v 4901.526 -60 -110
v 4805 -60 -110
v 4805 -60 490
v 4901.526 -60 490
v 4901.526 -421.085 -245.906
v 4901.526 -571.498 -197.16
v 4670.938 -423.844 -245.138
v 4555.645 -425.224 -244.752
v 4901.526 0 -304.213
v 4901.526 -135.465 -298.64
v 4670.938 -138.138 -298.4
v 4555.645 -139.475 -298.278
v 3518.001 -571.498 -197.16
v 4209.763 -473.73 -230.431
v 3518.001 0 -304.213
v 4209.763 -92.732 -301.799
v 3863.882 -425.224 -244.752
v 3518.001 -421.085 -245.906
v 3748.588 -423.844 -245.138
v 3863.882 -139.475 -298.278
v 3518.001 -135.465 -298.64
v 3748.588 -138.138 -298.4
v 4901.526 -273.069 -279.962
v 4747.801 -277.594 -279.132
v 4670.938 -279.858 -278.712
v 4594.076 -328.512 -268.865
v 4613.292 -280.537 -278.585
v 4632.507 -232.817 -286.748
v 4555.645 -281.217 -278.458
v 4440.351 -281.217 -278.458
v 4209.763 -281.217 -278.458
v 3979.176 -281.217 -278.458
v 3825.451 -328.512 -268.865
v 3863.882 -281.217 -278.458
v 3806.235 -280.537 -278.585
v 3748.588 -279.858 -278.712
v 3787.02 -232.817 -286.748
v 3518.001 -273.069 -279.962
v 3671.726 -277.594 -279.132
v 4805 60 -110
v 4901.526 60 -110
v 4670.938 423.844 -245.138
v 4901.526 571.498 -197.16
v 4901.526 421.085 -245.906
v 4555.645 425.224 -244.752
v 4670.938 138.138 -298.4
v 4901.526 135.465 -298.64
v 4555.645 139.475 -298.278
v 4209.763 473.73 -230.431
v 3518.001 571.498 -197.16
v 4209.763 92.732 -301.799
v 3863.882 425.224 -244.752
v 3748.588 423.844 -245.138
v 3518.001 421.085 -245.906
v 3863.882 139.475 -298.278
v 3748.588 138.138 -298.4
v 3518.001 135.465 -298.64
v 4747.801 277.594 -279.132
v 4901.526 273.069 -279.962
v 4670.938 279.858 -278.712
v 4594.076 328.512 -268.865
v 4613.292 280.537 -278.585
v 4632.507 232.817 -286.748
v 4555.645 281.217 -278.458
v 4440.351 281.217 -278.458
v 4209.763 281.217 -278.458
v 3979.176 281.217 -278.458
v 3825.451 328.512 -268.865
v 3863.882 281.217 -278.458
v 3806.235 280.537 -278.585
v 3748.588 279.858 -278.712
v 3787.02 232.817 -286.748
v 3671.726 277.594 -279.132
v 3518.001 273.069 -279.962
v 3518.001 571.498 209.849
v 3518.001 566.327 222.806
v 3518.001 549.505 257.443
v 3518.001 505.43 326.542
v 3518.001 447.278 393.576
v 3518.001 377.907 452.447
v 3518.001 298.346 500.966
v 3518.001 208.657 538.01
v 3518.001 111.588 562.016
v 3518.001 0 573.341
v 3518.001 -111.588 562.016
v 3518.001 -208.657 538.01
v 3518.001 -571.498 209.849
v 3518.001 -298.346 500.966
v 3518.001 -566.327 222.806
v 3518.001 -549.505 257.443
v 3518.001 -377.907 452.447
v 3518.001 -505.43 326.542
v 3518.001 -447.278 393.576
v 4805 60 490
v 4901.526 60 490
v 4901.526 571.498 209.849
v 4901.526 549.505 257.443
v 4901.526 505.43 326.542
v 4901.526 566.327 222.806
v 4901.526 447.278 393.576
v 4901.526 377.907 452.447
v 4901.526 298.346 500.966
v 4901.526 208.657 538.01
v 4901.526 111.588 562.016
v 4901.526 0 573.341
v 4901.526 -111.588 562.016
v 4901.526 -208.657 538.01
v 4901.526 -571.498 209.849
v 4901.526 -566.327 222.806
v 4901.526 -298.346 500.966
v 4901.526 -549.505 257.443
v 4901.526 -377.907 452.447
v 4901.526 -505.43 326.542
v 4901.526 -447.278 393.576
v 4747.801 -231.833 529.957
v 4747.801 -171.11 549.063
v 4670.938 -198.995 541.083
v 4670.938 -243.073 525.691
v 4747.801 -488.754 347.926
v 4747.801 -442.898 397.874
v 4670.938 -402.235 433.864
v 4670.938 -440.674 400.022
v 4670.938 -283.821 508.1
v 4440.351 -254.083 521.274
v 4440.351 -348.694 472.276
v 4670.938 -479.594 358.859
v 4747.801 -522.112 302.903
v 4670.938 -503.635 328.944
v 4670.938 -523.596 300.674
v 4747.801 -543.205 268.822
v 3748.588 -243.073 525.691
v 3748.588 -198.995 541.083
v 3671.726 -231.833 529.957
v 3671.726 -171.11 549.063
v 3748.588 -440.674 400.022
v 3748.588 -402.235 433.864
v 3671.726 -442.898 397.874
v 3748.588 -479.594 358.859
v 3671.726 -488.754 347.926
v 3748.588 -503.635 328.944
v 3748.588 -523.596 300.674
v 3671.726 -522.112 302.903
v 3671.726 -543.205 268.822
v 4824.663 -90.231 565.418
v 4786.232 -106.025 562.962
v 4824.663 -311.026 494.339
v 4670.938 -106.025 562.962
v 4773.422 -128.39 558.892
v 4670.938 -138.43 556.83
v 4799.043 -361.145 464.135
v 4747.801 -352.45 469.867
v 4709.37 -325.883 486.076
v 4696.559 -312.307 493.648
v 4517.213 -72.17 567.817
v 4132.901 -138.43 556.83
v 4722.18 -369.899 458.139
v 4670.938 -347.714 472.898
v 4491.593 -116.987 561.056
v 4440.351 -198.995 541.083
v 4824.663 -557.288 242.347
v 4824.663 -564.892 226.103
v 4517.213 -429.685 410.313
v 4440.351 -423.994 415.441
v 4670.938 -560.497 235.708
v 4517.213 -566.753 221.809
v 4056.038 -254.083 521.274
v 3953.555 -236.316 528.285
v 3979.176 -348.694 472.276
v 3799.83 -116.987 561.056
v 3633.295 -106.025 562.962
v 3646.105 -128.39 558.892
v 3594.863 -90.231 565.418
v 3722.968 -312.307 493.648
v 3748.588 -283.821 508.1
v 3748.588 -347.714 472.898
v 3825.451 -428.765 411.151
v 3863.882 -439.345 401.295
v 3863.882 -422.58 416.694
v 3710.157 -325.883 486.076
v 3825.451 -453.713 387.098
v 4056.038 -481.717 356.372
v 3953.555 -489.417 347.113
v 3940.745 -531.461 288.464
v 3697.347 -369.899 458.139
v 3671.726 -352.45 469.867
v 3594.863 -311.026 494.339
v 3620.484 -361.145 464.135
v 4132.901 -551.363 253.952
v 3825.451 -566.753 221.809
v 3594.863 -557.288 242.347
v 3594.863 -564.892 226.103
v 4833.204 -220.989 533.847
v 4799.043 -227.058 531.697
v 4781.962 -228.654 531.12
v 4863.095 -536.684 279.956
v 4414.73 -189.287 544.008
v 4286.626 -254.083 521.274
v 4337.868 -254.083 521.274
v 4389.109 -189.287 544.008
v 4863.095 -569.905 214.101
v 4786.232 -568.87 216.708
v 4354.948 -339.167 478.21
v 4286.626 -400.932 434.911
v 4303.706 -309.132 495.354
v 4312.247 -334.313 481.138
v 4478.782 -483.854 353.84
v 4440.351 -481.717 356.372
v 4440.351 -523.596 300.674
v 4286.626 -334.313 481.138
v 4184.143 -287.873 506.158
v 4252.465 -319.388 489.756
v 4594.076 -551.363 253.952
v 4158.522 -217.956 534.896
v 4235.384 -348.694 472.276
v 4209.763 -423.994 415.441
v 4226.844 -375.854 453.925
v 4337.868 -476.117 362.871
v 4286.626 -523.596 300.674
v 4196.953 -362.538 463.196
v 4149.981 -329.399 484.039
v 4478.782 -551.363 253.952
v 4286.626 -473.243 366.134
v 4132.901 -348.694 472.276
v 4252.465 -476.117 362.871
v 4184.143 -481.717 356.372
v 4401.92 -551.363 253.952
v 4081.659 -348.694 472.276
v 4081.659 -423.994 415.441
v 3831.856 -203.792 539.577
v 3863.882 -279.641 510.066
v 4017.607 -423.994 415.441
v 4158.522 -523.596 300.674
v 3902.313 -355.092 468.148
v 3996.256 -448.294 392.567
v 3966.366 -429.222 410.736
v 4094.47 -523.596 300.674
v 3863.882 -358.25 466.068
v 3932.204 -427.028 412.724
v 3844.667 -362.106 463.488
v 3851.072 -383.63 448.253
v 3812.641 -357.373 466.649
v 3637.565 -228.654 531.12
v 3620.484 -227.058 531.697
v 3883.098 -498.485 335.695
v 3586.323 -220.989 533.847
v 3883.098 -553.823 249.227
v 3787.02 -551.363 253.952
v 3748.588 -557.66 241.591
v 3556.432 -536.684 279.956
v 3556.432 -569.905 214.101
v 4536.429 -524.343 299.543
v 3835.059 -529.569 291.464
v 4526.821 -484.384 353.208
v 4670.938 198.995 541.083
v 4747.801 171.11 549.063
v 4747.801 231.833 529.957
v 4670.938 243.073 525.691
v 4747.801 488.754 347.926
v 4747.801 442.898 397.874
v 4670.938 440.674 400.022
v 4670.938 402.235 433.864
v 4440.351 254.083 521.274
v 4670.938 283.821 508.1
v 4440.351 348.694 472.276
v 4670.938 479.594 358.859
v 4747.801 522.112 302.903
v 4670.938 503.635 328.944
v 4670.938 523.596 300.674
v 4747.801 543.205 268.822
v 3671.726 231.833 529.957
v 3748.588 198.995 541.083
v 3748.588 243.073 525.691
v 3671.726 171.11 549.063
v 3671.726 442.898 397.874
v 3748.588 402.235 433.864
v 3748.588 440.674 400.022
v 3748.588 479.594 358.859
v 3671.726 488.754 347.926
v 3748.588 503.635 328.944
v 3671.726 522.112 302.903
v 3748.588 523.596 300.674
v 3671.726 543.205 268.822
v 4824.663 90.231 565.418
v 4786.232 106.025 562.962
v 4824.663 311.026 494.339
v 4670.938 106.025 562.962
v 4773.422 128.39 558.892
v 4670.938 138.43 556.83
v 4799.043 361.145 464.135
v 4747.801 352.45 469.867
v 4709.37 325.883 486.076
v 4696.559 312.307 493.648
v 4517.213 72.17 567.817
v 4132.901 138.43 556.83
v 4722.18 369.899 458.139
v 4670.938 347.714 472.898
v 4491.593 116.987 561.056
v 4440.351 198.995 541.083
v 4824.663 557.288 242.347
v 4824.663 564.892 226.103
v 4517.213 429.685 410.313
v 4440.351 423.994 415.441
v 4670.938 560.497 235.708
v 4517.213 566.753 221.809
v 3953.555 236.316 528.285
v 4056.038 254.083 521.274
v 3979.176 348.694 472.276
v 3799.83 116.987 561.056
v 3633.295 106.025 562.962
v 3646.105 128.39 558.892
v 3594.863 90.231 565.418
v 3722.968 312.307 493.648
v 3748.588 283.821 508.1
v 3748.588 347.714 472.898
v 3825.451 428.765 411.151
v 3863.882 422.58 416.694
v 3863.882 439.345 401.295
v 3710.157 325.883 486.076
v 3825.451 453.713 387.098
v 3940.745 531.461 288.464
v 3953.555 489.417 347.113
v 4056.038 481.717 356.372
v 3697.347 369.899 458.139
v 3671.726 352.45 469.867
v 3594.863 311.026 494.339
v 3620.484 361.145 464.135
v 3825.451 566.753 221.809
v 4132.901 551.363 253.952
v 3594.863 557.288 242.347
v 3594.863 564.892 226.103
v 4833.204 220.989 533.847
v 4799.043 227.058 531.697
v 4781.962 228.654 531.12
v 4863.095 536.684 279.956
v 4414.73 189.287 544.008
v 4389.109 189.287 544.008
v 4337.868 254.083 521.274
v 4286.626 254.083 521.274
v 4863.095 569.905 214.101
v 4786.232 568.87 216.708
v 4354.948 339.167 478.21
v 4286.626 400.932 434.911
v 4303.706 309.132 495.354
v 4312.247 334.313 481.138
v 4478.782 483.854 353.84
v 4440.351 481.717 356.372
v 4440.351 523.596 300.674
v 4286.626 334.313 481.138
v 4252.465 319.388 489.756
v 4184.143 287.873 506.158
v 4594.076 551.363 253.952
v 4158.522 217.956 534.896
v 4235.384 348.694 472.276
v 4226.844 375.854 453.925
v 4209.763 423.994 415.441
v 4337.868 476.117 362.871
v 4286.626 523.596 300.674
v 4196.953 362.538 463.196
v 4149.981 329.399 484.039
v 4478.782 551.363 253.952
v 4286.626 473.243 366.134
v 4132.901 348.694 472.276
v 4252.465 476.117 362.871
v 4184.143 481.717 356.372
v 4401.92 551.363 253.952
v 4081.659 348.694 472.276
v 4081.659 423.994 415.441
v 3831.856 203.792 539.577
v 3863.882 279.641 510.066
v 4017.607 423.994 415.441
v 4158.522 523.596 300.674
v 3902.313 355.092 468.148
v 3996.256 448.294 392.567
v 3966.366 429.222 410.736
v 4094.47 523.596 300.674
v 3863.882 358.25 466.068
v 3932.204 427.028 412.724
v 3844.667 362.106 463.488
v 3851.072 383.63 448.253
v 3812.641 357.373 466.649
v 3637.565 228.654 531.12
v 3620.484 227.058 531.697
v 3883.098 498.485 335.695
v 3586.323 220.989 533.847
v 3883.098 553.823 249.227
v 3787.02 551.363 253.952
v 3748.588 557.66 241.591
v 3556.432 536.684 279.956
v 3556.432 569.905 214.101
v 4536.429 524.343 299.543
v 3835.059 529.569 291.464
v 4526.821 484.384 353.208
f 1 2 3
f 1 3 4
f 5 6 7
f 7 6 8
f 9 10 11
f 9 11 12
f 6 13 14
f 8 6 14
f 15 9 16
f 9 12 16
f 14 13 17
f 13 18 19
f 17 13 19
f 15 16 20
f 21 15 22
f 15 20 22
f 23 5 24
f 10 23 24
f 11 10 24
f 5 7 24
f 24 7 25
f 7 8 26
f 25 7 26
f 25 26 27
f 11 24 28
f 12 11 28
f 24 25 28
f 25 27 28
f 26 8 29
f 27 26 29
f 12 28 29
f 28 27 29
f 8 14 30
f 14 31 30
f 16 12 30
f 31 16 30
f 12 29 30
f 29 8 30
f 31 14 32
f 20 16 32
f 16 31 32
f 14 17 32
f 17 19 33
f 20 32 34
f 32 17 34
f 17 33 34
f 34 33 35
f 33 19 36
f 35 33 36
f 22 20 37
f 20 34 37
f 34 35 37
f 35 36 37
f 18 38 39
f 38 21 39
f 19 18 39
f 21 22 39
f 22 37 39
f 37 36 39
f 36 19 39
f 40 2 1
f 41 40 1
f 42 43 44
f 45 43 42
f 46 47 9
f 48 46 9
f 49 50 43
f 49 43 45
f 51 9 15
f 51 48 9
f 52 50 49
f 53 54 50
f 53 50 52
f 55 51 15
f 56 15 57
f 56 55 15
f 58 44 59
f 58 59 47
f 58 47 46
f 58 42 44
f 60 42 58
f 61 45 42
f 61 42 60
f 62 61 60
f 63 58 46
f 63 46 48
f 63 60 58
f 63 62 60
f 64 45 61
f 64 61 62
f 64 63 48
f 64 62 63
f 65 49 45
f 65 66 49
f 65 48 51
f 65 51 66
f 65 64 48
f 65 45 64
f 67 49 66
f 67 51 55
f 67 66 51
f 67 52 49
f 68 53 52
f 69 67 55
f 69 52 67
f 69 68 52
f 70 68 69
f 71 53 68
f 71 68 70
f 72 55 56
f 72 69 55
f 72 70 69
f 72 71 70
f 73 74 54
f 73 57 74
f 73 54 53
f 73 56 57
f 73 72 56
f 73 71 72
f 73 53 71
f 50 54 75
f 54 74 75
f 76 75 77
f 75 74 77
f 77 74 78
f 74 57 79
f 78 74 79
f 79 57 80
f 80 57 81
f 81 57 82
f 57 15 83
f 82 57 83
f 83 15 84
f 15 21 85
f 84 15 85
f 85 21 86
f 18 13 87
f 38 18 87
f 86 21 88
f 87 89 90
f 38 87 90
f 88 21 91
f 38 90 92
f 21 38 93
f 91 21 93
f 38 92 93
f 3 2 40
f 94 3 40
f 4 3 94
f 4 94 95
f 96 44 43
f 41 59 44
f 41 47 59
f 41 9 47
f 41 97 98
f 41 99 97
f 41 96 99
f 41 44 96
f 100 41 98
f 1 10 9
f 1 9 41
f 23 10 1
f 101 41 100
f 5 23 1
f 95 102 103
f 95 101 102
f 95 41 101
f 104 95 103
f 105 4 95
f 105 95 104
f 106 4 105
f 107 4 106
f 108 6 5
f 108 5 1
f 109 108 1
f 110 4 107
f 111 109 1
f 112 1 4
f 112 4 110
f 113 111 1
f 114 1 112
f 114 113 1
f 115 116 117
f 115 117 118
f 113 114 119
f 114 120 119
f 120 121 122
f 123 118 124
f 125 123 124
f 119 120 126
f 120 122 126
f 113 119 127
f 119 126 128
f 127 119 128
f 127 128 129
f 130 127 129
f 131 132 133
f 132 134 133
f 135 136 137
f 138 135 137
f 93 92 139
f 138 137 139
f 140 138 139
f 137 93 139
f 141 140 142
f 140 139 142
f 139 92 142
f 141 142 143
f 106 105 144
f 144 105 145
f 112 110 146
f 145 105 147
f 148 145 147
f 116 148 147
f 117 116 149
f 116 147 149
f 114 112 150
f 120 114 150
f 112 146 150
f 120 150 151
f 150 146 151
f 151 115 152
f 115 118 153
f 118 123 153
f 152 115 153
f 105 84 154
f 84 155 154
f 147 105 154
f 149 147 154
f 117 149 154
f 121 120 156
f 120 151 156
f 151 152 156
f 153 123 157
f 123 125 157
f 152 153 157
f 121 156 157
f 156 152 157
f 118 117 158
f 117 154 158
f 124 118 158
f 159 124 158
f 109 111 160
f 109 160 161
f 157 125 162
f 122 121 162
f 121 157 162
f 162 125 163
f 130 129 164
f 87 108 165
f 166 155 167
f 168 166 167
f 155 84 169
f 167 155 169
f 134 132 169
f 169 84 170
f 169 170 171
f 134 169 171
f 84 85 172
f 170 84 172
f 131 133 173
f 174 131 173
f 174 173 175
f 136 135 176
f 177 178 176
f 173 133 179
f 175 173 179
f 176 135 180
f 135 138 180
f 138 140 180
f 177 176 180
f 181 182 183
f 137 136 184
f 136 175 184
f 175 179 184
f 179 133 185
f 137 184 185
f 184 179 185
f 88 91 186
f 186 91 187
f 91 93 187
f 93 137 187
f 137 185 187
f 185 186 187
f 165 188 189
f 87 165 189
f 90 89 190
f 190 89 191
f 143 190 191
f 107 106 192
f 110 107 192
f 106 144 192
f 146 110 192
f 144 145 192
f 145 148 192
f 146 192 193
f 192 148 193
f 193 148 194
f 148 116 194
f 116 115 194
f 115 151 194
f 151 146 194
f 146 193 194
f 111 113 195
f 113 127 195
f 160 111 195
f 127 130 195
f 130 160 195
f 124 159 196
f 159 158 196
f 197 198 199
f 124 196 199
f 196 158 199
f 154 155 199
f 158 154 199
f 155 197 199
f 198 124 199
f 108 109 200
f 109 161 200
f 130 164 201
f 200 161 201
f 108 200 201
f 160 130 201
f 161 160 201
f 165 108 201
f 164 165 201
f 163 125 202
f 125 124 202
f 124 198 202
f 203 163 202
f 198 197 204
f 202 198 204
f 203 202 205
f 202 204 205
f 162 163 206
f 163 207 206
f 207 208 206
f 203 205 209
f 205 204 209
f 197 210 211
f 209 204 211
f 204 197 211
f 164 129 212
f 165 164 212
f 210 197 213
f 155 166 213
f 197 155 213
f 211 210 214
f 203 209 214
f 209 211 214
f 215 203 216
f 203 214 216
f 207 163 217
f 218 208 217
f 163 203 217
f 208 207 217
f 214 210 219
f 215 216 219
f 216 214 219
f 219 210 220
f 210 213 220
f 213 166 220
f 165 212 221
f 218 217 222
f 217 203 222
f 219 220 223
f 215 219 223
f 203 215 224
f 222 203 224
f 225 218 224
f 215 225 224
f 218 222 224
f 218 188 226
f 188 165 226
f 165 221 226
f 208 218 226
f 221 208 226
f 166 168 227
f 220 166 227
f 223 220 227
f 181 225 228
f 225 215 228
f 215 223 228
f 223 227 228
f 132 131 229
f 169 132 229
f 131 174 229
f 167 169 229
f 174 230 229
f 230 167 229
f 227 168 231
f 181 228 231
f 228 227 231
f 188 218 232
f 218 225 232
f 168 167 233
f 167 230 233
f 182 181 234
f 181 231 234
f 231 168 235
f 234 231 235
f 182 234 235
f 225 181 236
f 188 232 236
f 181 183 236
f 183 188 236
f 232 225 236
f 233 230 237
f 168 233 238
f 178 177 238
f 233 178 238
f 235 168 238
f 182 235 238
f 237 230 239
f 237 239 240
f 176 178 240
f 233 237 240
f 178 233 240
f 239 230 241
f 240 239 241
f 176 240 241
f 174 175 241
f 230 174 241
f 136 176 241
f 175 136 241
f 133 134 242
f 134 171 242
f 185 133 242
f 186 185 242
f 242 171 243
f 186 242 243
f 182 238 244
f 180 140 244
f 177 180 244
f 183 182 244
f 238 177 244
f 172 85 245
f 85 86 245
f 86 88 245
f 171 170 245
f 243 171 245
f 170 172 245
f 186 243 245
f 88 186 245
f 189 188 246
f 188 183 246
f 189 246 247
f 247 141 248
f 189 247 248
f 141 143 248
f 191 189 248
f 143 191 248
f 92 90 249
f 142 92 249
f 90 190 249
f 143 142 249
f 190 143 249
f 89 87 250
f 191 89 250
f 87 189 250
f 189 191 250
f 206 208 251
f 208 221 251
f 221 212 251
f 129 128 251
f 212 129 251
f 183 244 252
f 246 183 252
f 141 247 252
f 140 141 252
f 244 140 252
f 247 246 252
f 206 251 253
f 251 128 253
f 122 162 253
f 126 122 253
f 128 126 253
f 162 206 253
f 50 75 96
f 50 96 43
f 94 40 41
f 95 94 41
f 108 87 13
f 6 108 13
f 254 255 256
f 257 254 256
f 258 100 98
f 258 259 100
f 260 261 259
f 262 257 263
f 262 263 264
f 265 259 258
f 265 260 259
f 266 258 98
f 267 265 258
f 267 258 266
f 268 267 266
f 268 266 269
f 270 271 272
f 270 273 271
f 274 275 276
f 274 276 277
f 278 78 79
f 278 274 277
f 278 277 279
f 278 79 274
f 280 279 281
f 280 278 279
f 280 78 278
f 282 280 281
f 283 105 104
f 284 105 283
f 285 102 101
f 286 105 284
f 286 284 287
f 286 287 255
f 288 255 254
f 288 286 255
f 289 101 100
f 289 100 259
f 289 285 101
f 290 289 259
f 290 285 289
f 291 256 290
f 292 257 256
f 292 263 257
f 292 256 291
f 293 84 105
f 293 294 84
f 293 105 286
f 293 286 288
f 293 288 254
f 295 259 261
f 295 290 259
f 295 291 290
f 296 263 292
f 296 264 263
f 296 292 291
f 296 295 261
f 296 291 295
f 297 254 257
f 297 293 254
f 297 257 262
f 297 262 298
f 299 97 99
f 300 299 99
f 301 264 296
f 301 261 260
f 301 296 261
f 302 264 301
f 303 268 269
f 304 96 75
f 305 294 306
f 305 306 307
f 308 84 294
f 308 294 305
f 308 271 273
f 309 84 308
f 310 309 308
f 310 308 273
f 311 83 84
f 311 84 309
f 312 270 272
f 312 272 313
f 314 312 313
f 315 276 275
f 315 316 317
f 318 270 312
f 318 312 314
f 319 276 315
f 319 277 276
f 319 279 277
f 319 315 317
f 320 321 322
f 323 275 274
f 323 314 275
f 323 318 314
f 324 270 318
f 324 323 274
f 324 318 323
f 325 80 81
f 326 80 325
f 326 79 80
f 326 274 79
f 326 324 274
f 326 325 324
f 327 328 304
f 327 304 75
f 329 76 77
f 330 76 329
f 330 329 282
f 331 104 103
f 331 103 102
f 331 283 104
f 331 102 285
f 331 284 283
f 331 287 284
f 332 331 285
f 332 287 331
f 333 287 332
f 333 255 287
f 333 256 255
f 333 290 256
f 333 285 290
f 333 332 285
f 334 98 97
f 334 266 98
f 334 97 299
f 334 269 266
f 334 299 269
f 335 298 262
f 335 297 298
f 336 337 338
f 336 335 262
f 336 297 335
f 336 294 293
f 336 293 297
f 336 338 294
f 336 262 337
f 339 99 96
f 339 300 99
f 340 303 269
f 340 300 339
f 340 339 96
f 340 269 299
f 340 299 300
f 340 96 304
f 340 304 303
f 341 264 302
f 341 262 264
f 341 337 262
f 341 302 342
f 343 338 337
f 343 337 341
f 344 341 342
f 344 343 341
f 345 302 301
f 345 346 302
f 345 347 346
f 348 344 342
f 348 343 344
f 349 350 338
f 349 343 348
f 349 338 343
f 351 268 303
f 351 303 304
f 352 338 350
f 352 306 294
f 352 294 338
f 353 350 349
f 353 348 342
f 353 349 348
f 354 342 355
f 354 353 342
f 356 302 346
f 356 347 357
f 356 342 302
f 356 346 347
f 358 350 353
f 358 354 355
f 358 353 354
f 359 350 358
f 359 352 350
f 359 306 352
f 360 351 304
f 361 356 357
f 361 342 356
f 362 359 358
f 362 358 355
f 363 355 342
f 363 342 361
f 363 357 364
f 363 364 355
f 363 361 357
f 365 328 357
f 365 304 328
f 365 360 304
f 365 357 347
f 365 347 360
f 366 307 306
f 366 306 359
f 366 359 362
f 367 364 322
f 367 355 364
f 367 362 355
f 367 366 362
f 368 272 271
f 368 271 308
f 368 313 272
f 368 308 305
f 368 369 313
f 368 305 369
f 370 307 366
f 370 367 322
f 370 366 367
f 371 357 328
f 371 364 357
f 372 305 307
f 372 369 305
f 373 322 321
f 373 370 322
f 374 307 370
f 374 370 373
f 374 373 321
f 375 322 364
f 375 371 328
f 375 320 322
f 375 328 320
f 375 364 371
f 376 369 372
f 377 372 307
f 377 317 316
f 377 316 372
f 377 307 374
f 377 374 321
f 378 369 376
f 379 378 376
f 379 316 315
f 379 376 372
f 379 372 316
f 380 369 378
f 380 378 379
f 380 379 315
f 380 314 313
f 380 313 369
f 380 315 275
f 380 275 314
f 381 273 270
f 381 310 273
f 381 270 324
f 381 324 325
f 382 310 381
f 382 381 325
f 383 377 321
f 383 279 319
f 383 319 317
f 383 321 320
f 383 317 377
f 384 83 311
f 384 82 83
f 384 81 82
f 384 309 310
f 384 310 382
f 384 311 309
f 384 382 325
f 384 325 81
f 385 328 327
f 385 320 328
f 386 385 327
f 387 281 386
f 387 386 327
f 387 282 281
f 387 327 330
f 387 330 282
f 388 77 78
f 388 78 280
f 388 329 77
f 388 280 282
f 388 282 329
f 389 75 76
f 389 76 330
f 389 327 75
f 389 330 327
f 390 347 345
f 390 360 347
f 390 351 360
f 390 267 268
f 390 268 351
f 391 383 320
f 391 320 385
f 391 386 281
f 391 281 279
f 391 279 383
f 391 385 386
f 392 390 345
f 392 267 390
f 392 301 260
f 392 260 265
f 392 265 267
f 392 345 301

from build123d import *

# Parameters (mm, degrees)
BOX001_W     = 100
BOX001_H     = 120
BOX001_DEPTH = 600


with BuildPart() as cube001:
    # Box001 → Box001 (new body)
    with BuildSketch(Plane(origin=(4805, -60, -110), x_dir=(1, 0, 0), z_dir=(0, 0, 1))):
        with Locations((50, 60)):
            Rectangle(BOX001_W, BOX001_H)
    extrude(amount=BOX001_DEPTH)


with BuildPart() as sweep002:
    # Sweep002: sweep along a path in Sketch005
    with BuildLine(Plane.XZ) as sweep002_path:
        Line((4901.525879, 0.31053), (3518.000977, 0.31053))
    # Sketch004 → Sweep002 (sweep)
    with BuildSketch(Plane.YZ.offset(4700)):
        with BuildLine():
            add(Edge.make_bspline(
                [(0, 573.341003), (-451.187195, 557.981873), (-571.498, 209.848953), (-571.498, 209.848953)],
                knots=[0, 0, 0, 0, 1, 1, 1, 1], degree=3))
            Line((-571.498, 209.848953), (-571.498, -197.16))
            add(Edge.make_bspline(
                [(-571.498, -197.16), (-276.684204, -306.229828), (0, -304.212738)],
                knots=[0, 0, 0, 1, 1, 1], degree=2))
            Line((0, -304.212738), (0, 573.341003))
        make_face()
    sweep(path=sweep002_path.line)


with BuildPart() as cut001:
    # Part__Mirroring004: instance of Sweep002
    add(sweep002.part.mirror(Plane(origin=(0, 0, 0), x_dir=(1, 0, 0), z_dir=(0, 1, 0))))

    # Fusion: union Sweep002
    add(sweep002.part)

    # Cut001: cut Cube001
    add(cube001.part, mode=Mode.SUBTRACT)


solid = cut001.part
